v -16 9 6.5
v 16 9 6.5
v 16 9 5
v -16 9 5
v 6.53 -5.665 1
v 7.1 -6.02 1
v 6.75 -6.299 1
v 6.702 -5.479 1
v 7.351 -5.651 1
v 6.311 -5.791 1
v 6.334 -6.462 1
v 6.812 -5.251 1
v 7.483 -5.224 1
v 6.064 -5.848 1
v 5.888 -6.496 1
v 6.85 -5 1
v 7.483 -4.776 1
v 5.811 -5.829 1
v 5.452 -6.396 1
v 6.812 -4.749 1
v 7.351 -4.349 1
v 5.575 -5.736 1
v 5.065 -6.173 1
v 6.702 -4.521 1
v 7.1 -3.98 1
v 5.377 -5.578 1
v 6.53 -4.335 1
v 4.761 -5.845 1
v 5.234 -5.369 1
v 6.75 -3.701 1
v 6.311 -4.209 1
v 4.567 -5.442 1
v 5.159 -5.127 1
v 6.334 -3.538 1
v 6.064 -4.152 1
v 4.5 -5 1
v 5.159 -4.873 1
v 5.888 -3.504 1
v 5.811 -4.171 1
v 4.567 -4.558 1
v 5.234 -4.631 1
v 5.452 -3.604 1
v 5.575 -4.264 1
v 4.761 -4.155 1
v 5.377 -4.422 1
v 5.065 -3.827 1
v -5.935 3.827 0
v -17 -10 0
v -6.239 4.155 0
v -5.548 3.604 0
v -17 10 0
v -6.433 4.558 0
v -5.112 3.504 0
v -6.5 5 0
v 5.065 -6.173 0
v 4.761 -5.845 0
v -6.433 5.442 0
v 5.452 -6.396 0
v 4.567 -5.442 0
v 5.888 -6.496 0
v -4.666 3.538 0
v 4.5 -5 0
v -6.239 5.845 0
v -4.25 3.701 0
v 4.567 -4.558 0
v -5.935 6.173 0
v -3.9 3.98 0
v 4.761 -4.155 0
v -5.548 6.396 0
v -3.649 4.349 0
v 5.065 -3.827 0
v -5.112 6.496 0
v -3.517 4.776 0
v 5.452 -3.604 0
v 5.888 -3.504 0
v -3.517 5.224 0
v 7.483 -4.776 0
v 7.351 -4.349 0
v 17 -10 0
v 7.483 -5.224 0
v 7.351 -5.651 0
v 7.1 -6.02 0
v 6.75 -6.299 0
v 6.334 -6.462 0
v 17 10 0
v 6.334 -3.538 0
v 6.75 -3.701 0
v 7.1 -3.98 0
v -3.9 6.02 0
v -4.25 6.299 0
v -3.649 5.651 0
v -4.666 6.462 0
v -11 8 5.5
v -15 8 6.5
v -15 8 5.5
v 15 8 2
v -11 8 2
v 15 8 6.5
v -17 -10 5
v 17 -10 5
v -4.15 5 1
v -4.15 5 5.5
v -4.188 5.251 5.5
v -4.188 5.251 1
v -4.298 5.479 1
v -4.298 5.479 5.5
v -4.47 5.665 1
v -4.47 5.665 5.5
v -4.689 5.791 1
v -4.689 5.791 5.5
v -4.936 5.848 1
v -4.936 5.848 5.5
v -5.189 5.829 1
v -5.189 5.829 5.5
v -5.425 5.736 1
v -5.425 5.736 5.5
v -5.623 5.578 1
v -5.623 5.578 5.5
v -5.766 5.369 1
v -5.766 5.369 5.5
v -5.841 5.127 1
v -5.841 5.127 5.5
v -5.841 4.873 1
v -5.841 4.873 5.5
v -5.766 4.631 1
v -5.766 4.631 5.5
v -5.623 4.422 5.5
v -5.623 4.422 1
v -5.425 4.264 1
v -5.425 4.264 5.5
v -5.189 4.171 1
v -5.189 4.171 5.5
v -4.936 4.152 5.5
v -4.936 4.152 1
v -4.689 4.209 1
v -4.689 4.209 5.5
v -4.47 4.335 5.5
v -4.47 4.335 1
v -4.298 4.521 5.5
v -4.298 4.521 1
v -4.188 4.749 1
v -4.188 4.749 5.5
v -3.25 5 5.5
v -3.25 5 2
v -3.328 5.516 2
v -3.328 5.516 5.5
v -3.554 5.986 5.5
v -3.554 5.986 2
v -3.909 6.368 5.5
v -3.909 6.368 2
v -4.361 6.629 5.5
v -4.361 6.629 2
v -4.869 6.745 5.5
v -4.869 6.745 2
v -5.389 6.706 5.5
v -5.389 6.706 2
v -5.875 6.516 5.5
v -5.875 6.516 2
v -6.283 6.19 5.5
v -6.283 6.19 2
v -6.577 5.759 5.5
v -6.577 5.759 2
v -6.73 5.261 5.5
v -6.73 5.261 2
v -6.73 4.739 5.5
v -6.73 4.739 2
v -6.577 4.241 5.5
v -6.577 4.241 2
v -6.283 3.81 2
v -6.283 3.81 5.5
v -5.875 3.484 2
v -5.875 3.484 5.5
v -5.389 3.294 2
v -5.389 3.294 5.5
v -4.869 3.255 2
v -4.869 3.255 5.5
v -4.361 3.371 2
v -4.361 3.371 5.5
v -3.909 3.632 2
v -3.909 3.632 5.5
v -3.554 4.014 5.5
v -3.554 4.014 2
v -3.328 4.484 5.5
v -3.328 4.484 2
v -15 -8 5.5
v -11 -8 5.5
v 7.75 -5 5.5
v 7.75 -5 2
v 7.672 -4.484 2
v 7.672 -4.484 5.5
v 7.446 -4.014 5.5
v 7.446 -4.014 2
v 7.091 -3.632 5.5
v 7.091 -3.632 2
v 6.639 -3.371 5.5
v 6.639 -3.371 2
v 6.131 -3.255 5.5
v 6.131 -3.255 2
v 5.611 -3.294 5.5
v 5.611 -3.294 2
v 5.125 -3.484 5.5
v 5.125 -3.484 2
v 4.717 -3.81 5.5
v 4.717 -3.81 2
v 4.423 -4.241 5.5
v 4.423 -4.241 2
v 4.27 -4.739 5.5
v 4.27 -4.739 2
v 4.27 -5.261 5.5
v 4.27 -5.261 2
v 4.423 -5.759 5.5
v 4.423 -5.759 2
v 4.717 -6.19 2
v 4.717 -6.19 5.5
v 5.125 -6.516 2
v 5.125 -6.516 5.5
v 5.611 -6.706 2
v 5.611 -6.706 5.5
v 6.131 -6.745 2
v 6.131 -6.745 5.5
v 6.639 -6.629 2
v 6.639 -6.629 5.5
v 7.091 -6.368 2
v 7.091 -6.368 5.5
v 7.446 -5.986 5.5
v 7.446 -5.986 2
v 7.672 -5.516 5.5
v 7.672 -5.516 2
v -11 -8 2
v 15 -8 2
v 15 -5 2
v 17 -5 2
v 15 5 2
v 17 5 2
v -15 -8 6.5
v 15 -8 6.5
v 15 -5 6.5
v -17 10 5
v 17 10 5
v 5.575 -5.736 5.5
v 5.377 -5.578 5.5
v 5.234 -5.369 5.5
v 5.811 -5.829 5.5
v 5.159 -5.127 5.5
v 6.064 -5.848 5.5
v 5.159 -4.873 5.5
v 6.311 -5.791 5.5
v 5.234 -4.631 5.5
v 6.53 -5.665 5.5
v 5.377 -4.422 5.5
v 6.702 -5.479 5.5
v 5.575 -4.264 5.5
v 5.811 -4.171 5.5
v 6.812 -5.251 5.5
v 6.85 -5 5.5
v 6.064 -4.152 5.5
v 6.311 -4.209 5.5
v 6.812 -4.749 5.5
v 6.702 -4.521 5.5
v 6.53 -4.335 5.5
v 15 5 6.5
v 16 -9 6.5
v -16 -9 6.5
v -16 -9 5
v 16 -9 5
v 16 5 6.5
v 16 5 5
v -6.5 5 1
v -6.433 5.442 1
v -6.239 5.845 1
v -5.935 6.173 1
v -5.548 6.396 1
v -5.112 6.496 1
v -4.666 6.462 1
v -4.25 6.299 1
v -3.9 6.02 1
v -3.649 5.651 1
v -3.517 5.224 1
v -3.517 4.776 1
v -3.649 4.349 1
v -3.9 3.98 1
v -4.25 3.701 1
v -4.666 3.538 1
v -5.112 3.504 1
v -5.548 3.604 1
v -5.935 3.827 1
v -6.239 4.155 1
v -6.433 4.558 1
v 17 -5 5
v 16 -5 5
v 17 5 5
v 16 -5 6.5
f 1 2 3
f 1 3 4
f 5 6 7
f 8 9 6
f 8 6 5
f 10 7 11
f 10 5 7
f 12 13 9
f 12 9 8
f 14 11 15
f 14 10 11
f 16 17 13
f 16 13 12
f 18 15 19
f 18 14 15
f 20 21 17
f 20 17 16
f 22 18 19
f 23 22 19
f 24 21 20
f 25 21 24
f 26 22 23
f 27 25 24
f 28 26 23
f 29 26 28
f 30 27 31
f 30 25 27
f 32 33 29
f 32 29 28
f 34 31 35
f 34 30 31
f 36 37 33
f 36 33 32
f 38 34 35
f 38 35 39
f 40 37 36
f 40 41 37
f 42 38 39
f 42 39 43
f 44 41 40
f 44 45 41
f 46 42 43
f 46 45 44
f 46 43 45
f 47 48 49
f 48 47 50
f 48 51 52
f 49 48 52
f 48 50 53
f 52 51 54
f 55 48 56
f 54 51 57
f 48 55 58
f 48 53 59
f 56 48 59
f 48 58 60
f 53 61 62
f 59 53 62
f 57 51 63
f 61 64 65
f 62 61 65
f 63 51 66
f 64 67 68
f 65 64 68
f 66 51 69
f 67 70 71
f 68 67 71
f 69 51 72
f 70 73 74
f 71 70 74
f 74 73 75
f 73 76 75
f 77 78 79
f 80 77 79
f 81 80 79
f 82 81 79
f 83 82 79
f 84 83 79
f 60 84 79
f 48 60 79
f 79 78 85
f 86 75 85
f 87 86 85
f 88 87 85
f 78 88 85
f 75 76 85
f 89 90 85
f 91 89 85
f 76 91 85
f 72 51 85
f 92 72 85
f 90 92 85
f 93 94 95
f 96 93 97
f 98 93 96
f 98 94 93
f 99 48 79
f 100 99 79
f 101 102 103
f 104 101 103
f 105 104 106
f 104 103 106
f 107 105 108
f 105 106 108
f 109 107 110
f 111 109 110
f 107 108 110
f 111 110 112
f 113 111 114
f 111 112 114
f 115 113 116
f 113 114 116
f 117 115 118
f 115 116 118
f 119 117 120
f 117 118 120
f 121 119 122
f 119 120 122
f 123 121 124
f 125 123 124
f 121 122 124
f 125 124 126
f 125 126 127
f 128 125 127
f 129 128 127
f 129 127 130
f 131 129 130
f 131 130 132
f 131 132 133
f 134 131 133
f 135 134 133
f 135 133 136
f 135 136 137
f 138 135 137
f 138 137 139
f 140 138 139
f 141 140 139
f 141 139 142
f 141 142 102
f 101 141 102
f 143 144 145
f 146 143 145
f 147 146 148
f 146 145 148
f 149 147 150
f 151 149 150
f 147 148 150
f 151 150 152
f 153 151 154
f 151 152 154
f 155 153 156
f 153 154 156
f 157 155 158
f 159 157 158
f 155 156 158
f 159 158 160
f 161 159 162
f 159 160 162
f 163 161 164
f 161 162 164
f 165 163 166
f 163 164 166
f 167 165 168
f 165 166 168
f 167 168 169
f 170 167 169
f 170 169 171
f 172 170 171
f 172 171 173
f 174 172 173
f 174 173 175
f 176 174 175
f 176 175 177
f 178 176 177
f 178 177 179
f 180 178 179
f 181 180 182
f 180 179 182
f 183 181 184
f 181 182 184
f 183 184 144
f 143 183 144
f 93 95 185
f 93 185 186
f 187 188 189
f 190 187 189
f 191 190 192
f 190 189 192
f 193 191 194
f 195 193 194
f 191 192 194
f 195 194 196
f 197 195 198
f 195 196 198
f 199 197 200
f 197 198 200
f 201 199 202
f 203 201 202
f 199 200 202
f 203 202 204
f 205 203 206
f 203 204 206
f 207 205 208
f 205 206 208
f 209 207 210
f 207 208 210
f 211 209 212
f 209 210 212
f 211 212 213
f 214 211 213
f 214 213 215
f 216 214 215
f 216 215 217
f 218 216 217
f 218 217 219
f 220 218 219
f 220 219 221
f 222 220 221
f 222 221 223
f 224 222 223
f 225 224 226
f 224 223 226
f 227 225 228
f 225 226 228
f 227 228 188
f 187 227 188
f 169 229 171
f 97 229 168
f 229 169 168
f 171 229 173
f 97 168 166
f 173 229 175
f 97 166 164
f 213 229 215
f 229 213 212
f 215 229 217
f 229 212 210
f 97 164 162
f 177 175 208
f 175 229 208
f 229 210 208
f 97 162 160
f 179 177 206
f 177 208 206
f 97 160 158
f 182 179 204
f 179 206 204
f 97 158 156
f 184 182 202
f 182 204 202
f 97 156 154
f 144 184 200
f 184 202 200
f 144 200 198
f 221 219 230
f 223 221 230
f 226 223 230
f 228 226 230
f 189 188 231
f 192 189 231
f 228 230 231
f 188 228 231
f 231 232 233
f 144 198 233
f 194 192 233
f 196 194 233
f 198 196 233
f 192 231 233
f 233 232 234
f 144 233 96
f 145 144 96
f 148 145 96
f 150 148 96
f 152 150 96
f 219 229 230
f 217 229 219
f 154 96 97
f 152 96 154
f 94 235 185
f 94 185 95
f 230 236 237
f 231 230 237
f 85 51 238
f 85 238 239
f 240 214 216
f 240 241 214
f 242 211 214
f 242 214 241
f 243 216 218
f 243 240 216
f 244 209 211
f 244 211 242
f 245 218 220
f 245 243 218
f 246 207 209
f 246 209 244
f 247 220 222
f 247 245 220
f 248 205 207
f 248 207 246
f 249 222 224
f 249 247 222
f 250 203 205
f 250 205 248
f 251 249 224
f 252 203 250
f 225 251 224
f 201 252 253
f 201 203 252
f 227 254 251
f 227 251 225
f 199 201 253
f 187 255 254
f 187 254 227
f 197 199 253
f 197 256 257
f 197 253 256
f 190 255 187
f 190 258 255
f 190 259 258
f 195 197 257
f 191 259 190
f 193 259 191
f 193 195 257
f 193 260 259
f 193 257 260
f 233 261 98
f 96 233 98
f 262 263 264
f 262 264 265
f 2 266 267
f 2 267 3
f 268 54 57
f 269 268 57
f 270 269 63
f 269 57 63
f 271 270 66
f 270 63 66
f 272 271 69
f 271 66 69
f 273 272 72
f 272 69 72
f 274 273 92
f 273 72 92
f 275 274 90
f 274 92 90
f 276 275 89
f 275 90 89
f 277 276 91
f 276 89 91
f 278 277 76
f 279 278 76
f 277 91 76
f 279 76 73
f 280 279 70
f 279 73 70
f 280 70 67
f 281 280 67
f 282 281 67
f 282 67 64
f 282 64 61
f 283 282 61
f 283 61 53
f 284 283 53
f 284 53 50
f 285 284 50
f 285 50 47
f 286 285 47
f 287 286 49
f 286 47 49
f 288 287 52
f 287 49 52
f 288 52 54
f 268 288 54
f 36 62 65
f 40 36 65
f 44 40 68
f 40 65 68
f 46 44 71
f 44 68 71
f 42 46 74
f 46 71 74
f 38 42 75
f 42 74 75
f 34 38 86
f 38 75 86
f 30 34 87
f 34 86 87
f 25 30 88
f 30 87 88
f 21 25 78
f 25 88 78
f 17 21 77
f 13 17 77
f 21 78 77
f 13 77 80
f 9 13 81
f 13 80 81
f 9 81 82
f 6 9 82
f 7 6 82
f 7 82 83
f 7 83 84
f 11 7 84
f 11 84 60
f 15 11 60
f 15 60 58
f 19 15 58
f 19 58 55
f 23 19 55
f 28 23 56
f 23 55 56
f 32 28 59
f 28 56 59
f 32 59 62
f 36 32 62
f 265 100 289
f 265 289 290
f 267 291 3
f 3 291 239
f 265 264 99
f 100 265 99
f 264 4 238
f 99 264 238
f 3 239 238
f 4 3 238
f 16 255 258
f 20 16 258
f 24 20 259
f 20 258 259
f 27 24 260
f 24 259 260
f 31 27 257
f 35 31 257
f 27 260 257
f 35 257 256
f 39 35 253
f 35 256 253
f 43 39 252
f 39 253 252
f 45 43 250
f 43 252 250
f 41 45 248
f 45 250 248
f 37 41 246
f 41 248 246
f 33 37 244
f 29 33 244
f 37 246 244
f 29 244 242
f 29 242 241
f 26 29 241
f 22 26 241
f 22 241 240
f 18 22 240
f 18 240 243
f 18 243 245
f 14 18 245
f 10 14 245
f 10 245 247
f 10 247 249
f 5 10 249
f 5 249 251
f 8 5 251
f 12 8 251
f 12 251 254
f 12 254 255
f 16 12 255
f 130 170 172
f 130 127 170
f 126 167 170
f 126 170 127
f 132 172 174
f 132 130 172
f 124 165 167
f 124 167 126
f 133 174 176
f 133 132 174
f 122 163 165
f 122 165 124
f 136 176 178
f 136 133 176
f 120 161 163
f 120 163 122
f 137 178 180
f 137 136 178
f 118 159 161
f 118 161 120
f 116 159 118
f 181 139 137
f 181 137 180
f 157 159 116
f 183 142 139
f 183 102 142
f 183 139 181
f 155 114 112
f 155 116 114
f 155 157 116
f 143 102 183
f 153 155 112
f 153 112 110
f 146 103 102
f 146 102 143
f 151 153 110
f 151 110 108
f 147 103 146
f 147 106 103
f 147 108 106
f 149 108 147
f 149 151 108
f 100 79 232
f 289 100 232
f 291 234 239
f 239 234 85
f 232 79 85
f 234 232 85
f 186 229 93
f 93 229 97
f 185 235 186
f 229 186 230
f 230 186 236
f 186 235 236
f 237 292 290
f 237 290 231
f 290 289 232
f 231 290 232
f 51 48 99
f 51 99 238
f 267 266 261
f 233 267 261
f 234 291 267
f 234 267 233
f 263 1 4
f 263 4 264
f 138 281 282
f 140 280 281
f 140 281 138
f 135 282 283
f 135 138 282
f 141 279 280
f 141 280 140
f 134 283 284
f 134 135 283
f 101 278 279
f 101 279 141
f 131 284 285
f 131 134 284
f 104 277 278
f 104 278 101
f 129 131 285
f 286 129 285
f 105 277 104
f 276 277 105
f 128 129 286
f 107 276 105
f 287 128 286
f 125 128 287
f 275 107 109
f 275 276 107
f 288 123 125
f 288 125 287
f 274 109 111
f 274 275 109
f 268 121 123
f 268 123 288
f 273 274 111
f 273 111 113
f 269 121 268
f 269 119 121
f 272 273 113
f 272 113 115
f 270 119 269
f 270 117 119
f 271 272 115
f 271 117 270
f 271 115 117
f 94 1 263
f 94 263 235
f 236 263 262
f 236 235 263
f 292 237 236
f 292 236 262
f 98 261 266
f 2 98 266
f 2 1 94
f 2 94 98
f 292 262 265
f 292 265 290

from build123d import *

# Parameters (mm, degrees)
SKETCH_1_W          = 34
SKETCH_1_H          = 20
EXTRUDE_1_DEPTH     = 6.5
SKETCH_2_W          = 30
SKETCH_2_H          = 16
CUT_EXTRUDE_1_DEPTH = 4.5
SKETCH_3_W          = 4.5
SKETCH_3_H          = 10
CUT_EXTRUDE_2_DEPTH = 2
CUT_EXTRUDE_3_DEPTH = 1.5
SKETCH_5_W          = 4
SKETCH_5_H          = 16
EXTRUDE_2_DEPTH     = 3.5
SKETCH_6_R          = 1.75
EXTRUDE_3_DEPTH     = 3.5
SKETCH_7_R          = 0.85
CUT_EXTRUDE_4_DEPTH = 21.475595229
SKETCH_8_R          = 1.5
CUT_EXTRUDE_5_DEPTH = 1


with BuildPart() as part:
    # 草图1 → 凸台-拉伸1 (new body)
    with BuildSketch(Plane.XY):
        Rectangle(SKETCH_1_W, SKETCH_1_H)
    extrude(amount=EXTRUDE_1_DEPTH)

    # 草图2 → 切除-拉伸1 (cut)
    with BuildSketch(Plane.XY.offset(6.5)):
        Rectangle(SKETCH_2_W, SKETCH_2_H)
    extrude(amount=-CUT_EXTRUDE_1_DEPTH, mode=Mode.SUBTRACT)

    # 草图3 → 切除-拉伸2 (cut)
    with BuildSketch(Plane(origin=(17, 0, 0), x_dir=(0, 0, -1), z_dir=(1, 0, 0))):
        with Locations((-4.25, 0)):
            Rectangle(SKETCH_3_W, SKETCH_3_H)
    extrude(amount=-CUT_EXTRUDE_2_DEPTH, mode=Mode.SUBTRACT)

    # 草图4 → 切除-拉伸3 (cut)
    with BuildSketch(Plane.XY.offset(6.5)):
        Polygon((16, 5), (16, 9), (-16, 9), (-16, -9), (16, -9), (16, -5), (17, -5), (17, -10), (-17, -10), (-17, 10), (17, 10), (17, 5), align=None)
    extrude(amount=-CUT_EXTRUDE_3_DEPTH, mode=Mode.SUBTRACT)

    # 草图5 → 凸台-拉伸2 (add)
    with BuildSketch(Plane.XY.offset(2)):
        with Locations((-13, 0)):
            Rectangle(SKETCH_5_W, SKETCH_5_H)
    extrude(amount=EXTRUDE_2_DEPTH)

    # 草图6 → 凸台-拉伸3 (add)
    with BuildSketch(Plane.XY.offset(2)):
        with Locations((-5, 5)):
            Circle(SKETCH_6_R)
        with Locations((6, -5)):
            Circle(SKETCH_6_R)
    extrude(amount=EXTRUDE_3_DEPTH)

    # 草图7 → 切除-拉伸4 (cut, through all)
    with BuildSketch(Plane.XY.offset(5.5)):
        with Locations((-5, 5)):
            Circle(SKETCH_7_R)
        with Locations((6, -5)):
            Circle(SKETCH_7_R)
    extrude(amount=-CUT_EXTRUDE_4_DEPTH, mode=Mode.SUBTRACT)

    # 草图8 → 切除-拉伸5 (cut)
    with BuildSketch(Plane(origin=(0, 0, 0), x_dir=(-1, 0, 0), z_dir=(0, 0, -1))):
        with Locations((-6, -5)):
            Circle(SKETCH_8_R)
        with Locations((5, 5)):
            Circle(SKETCH_8_R)
    extrude(amount=-CUT_EXTRUDE_5_DEPTH, mode=Mode.SUBTRACT)


solid = part.part
